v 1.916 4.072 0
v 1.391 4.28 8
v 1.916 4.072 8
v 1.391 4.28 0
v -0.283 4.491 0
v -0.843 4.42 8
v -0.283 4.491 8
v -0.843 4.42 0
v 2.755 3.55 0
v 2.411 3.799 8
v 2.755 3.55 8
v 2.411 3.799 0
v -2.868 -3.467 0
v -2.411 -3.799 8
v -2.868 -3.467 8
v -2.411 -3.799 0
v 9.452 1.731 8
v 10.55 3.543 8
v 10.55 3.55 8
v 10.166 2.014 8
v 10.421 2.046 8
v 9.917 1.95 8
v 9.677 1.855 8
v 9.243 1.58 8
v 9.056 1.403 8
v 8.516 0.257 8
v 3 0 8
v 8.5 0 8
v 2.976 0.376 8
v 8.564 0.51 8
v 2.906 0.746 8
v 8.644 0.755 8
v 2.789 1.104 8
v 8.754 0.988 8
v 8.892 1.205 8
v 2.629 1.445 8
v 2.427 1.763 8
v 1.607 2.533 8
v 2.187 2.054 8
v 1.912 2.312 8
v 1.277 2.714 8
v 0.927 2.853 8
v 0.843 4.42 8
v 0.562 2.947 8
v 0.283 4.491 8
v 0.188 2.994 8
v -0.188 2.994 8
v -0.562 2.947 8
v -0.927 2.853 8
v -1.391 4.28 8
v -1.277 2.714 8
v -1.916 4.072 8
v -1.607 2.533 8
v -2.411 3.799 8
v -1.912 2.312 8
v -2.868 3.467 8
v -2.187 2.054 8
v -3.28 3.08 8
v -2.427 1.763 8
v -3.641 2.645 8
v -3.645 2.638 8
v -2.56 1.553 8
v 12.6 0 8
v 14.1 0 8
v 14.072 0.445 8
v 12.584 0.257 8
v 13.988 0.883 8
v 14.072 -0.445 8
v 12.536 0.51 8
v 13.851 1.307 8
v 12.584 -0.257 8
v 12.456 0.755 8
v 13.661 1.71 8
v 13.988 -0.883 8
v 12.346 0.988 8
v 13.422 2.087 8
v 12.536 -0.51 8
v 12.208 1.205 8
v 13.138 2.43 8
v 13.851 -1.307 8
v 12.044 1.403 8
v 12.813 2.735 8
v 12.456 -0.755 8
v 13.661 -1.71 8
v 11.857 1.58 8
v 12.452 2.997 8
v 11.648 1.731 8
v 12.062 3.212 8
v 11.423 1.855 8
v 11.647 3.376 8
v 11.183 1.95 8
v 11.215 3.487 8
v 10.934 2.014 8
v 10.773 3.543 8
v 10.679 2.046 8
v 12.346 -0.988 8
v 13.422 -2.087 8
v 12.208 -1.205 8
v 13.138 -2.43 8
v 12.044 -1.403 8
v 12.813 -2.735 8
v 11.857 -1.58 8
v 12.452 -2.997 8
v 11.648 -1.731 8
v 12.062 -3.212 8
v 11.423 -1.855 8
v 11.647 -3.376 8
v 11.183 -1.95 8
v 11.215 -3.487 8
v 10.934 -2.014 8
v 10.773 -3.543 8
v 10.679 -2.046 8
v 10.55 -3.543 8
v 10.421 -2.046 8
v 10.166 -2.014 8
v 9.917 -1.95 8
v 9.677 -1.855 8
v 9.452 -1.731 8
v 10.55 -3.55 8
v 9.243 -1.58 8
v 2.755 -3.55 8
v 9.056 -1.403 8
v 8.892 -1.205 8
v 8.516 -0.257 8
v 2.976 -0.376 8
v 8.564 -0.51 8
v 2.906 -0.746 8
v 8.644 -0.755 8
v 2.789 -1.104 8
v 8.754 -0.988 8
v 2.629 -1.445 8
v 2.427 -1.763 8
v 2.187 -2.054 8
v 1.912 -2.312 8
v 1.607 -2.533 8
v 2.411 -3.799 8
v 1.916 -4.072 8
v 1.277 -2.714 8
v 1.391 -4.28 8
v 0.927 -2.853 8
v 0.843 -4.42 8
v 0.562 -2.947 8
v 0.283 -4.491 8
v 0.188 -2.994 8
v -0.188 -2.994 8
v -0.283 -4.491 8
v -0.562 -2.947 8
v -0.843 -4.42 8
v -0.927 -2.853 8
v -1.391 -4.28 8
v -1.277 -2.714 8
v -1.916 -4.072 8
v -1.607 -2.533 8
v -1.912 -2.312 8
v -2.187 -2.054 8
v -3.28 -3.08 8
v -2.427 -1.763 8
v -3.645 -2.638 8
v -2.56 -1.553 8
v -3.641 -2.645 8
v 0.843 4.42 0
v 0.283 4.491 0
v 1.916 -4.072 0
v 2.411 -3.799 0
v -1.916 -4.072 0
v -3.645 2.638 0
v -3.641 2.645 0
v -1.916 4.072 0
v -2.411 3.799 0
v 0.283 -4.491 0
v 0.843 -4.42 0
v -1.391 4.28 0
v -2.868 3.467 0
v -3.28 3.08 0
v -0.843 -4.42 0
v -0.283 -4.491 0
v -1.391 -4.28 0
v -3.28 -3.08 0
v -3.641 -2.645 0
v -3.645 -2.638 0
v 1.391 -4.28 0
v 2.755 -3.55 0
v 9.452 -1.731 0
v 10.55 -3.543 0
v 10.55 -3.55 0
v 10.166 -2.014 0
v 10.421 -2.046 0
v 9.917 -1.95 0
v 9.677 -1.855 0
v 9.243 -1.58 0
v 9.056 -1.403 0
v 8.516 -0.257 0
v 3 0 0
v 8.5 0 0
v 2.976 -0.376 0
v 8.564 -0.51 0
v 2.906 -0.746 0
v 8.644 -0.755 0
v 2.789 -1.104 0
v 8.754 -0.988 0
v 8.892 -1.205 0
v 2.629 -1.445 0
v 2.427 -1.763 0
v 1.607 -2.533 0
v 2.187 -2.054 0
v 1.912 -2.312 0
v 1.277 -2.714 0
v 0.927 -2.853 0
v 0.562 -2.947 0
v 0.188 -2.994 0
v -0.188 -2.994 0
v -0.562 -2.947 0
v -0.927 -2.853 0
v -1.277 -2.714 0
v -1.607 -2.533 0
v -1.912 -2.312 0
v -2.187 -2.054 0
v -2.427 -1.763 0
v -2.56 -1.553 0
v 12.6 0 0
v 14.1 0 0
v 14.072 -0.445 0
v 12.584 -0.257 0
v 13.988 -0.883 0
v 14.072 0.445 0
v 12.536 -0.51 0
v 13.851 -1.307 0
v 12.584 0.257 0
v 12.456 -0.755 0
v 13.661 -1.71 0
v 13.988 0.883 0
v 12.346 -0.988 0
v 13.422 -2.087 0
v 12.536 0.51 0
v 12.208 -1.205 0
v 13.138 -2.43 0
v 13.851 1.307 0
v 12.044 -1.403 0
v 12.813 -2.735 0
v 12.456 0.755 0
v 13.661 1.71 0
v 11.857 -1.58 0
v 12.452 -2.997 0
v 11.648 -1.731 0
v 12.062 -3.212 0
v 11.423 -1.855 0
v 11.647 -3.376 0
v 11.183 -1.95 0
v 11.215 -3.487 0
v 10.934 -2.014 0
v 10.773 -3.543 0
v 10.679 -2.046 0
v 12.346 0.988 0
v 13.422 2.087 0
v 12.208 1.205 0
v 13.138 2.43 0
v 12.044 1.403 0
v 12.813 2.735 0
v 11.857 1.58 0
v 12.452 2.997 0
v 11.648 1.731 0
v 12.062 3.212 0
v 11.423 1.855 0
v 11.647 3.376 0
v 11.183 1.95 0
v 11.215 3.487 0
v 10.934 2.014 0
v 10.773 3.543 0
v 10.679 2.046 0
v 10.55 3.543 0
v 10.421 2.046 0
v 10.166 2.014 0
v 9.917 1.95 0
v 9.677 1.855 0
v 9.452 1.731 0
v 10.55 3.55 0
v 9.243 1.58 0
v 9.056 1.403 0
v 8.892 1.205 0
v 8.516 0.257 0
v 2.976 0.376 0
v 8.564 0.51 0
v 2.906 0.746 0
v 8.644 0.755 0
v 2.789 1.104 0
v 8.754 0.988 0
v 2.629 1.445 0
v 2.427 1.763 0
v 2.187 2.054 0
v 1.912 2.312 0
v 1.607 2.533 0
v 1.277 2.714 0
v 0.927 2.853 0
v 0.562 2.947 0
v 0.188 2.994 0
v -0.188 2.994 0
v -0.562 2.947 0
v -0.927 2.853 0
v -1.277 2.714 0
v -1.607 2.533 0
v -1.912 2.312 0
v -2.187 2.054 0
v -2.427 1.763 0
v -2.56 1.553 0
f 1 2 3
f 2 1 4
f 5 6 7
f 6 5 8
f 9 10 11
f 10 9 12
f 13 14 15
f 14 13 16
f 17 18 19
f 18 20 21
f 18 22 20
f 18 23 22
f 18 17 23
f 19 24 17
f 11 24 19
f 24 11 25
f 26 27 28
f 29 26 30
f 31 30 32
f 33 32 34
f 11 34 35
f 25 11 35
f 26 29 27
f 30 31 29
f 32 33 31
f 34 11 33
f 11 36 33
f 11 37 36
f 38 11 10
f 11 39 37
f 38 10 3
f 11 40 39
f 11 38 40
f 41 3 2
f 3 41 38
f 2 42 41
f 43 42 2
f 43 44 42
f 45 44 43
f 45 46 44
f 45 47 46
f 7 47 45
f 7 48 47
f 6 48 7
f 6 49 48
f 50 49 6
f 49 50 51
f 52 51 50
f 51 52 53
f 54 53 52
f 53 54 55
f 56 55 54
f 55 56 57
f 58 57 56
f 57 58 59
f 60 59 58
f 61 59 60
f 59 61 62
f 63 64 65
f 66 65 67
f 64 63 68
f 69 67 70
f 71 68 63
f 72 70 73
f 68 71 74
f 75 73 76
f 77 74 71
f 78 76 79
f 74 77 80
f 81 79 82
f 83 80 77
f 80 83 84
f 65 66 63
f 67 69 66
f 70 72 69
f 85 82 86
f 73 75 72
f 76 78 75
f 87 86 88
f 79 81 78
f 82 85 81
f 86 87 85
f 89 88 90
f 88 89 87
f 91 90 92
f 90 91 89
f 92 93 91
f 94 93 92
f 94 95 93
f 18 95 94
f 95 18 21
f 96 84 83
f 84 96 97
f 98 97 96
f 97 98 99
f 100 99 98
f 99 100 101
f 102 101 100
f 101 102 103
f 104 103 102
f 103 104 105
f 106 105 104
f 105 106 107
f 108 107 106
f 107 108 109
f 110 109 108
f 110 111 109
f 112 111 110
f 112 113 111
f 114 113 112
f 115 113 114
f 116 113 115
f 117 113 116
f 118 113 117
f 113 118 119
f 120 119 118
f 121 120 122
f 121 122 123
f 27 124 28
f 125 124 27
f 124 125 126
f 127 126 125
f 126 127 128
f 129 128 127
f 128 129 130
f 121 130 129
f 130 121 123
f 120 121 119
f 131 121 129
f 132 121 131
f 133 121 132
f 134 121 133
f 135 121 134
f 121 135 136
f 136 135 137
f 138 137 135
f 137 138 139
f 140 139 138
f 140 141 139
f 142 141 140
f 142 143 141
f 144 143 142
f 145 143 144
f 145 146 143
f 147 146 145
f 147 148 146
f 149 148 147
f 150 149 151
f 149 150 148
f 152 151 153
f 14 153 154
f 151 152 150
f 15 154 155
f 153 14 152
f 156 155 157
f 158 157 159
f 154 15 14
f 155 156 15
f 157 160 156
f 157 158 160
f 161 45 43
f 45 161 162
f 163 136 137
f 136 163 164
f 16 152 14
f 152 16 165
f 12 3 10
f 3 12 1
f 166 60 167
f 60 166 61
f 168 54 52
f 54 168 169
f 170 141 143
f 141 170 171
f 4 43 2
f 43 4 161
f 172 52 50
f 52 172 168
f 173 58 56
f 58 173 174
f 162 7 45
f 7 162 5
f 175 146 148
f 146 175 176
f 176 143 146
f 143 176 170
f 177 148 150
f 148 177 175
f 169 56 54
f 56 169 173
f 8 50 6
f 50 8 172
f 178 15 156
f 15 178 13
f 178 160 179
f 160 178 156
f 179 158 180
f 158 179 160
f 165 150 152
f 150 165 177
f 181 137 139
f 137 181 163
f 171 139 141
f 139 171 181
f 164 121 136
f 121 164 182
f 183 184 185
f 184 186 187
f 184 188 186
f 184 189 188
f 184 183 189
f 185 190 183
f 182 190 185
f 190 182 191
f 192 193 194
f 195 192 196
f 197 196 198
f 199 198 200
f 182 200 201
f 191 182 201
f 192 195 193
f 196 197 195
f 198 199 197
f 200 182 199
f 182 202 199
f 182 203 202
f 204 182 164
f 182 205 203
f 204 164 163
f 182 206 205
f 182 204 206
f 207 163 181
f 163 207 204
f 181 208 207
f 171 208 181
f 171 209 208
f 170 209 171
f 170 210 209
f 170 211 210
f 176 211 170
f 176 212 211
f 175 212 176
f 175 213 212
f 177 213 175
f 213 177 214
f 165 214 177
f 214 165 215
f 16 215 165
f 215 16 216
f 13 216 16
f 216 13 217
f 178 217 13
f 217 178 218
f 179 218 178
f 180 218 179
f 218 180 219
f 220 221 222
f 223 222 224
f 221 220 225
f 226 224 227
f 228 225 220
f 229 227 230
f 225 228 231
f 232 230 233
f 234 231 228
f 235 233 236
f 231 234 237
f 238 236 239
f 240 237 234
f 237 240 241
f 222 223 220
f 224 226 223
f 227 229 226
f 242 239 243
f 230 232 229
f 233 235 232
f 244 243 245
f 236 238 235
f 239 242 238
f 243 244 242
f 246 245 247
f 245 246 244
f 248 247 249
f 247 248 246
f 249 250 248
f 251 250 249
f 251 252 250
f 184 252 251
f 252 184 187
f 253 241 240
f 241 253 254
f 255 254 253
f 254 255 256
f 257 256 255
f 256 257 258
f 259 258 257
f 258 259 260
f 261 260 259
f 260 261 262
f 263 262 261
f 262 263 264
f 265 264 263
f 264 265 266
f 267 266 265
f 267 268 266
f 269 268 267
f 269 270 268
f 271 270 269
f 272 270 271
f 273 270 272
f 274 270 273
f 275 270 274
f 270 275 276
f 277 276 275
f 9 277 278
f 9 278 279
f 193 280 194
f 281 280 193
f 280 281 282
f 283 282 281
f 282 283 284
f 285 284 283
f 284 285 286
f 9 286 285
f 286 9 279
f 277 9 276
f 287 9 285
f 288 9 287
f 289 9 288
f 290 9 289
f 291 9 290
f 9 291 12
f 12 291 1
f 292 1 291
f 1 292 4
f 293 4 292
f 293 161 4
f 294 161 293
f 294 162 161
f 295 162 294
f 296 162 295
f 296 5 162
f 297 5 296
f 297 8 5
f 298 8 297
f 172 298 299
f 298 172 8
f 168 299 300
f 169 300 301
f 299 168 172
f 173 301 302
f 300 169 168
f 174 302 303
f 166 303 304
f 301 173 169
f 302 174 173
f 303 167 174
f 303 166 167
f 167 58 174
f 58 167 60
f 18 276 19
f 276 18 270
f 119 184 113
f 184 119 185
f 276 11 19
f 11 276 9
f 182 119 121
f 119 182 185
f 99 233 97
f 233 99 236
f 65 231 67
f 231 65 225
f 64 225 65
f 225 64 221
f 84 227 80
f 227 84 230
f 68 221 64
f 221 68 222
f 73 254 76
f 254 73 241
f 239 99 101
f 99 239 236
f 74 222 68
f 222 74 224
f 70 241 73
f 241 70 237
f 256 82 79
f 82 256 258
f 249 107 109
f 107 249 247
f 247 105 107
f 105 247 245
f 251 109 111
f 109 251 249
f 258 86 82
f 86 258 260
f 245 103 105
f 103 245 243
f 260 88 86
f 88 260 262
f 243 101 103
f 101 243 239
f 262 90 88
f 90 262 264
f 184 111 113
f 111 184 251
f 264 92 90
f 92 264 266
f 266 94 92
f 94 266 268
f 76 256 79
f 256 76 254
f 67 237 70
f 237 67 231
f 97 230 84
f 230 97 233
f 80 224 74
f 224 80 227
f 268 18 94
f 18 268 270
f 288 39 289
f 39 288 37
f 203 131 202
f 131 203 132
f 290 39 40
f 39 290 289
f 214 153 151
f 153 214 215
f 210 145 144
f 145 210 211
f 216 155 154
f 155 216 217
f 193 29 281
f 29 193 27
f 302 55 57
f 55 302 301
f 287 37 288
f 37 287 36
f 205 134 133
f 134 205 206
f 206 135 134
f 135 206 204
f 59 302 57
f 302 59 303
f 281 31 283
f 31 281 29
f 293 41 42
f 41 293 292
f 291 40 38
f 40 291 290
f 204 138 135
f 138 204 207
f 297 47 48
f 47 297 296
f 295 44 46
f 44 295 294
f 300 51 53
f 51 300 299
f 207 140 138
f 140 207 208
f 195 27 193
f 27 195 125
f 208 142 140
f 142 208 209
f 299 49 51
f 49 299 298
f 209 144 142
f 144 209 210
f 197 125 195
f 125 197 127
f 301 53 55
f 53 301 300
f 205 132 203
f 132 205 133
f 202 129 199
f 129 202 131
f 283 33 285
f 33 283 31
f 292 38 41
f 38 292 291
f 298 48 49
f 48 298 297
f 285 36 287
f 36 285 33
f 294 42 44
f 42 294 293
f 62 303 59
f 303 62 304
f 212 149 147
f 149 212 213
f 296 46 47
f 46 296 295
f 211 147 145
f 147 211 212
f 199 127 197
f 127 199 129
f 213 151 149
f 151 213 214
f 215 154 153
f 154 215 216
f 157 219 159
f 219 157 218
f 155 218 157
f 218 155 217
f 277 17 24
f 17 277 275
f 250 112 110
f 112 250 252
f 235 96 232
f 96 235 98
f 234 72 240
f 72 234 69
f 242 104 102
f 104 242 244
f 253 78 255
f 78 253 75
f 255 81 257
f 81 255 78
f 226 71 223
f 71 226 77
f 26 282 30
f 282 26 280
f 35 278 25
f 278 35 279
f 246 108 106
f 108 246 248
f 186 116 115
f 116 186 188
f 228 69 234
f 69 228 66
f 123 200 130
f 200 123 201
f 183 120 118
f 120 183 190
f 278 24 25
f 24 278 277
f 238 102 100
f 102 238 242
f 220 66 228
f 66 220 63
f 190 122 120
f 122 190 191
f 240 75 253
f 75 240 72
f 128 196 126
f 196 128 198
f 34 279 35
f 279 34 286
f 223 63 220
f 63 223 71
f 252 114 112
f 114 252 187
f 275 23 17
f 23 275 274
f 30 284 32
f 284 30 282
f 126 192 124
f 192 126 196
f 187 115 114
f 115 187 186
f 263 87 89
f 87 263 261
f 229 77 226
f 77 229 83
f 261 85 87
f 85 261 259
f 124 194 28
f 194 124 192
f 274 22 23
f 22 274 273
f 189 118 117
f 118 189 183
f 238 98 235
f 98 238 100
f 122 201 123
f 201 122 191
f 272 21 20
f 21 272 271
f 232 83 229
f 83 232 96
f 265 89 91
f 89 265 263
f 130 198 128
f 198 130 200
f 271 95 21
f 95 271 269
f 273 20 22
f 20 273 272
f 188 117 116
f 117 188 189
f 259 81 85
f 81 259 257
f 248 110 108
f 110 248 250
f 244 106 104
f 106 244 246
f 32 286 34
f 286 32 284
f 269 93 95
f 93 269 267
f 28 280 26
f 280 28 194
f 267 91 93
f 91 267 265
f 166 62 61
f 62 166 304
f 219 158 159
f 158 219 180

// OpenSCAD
// M3D PTFE tube Holder
// Tony Hansen 2015
// Inspired by the filament guides <http://www.thingiverse.com/thing:858100>
// and <http://www.thingiverse.com/thing:865138>,
// which were designed to guide filament.
// This is instead sized to guide a 4mm PTFE tube
// and the values are customizable to any size.

// the hole where the PTFE tube goes
topHoleDiameter = 4.1;  
// the M3D cable going to the print head
bottomHoleDiameter = 6; 
// the filament thickness around the holes
wallThickness = 1.5;    
// the length of the tube
tubeLength = 8;             
// the distance between holes
distanceBetweenHoles = 4;              

difference() {
    epsilon=0.1;
    union() {
        // Cylinder connecting to M3D Cable
        cylinder(d=bottomHoleDiameter + wallThickness * 2,h=tubeLength,$fn=50);

        // "square portion"
        translate([0,-topHoleDiameter/2-wallThickness,0])
        cube([bottomHoleDiameter/2 + topHoleDiameter/2 + distanceBetweenHoles + wallThickness, 
            topHoleDiameter + 2*wallThickness, tubeLength]);

        // Top cylinder that holds the PTFE
        translate([bottomHoleDiameter/2+distanceBetweenHoles+topHoleDiameter/2+wallThickness,0,0])
            cylinder(d=topHoleDiameter+wallThickness*2, h=tubeLength, $fn=50);
    }

    // The hole for the M3D Cable
    translate([0,0,-epsilon]) 
        cylinder(d=bottomHoleDiameter,h=tubeLength+2*epsilon,$fn=50);

    // The hole for the PTFE tube
    translate([bottomHoleDiameter/2+distanceBetweenHoles+topHoleDiameter/2+wallThickness,
        0,0])
        translate([0,0,-epsilon])
        cylinder(d=topHoleDiameter, h=tubeLength+2*epsilon, $fn=50);

    // The wedge opening for the M3D Cable
    translate([-bottomHoleDiameter*7/8,0,0])
        rotate([0,0,45])
        translate([-bottomHoleDiameter/2,-bottomHoleDiameter/2,-epsilon])
        cube([bottomHoleDiameter,bottomHoleDiameter,tubeLength+2*epsilon]);
}
